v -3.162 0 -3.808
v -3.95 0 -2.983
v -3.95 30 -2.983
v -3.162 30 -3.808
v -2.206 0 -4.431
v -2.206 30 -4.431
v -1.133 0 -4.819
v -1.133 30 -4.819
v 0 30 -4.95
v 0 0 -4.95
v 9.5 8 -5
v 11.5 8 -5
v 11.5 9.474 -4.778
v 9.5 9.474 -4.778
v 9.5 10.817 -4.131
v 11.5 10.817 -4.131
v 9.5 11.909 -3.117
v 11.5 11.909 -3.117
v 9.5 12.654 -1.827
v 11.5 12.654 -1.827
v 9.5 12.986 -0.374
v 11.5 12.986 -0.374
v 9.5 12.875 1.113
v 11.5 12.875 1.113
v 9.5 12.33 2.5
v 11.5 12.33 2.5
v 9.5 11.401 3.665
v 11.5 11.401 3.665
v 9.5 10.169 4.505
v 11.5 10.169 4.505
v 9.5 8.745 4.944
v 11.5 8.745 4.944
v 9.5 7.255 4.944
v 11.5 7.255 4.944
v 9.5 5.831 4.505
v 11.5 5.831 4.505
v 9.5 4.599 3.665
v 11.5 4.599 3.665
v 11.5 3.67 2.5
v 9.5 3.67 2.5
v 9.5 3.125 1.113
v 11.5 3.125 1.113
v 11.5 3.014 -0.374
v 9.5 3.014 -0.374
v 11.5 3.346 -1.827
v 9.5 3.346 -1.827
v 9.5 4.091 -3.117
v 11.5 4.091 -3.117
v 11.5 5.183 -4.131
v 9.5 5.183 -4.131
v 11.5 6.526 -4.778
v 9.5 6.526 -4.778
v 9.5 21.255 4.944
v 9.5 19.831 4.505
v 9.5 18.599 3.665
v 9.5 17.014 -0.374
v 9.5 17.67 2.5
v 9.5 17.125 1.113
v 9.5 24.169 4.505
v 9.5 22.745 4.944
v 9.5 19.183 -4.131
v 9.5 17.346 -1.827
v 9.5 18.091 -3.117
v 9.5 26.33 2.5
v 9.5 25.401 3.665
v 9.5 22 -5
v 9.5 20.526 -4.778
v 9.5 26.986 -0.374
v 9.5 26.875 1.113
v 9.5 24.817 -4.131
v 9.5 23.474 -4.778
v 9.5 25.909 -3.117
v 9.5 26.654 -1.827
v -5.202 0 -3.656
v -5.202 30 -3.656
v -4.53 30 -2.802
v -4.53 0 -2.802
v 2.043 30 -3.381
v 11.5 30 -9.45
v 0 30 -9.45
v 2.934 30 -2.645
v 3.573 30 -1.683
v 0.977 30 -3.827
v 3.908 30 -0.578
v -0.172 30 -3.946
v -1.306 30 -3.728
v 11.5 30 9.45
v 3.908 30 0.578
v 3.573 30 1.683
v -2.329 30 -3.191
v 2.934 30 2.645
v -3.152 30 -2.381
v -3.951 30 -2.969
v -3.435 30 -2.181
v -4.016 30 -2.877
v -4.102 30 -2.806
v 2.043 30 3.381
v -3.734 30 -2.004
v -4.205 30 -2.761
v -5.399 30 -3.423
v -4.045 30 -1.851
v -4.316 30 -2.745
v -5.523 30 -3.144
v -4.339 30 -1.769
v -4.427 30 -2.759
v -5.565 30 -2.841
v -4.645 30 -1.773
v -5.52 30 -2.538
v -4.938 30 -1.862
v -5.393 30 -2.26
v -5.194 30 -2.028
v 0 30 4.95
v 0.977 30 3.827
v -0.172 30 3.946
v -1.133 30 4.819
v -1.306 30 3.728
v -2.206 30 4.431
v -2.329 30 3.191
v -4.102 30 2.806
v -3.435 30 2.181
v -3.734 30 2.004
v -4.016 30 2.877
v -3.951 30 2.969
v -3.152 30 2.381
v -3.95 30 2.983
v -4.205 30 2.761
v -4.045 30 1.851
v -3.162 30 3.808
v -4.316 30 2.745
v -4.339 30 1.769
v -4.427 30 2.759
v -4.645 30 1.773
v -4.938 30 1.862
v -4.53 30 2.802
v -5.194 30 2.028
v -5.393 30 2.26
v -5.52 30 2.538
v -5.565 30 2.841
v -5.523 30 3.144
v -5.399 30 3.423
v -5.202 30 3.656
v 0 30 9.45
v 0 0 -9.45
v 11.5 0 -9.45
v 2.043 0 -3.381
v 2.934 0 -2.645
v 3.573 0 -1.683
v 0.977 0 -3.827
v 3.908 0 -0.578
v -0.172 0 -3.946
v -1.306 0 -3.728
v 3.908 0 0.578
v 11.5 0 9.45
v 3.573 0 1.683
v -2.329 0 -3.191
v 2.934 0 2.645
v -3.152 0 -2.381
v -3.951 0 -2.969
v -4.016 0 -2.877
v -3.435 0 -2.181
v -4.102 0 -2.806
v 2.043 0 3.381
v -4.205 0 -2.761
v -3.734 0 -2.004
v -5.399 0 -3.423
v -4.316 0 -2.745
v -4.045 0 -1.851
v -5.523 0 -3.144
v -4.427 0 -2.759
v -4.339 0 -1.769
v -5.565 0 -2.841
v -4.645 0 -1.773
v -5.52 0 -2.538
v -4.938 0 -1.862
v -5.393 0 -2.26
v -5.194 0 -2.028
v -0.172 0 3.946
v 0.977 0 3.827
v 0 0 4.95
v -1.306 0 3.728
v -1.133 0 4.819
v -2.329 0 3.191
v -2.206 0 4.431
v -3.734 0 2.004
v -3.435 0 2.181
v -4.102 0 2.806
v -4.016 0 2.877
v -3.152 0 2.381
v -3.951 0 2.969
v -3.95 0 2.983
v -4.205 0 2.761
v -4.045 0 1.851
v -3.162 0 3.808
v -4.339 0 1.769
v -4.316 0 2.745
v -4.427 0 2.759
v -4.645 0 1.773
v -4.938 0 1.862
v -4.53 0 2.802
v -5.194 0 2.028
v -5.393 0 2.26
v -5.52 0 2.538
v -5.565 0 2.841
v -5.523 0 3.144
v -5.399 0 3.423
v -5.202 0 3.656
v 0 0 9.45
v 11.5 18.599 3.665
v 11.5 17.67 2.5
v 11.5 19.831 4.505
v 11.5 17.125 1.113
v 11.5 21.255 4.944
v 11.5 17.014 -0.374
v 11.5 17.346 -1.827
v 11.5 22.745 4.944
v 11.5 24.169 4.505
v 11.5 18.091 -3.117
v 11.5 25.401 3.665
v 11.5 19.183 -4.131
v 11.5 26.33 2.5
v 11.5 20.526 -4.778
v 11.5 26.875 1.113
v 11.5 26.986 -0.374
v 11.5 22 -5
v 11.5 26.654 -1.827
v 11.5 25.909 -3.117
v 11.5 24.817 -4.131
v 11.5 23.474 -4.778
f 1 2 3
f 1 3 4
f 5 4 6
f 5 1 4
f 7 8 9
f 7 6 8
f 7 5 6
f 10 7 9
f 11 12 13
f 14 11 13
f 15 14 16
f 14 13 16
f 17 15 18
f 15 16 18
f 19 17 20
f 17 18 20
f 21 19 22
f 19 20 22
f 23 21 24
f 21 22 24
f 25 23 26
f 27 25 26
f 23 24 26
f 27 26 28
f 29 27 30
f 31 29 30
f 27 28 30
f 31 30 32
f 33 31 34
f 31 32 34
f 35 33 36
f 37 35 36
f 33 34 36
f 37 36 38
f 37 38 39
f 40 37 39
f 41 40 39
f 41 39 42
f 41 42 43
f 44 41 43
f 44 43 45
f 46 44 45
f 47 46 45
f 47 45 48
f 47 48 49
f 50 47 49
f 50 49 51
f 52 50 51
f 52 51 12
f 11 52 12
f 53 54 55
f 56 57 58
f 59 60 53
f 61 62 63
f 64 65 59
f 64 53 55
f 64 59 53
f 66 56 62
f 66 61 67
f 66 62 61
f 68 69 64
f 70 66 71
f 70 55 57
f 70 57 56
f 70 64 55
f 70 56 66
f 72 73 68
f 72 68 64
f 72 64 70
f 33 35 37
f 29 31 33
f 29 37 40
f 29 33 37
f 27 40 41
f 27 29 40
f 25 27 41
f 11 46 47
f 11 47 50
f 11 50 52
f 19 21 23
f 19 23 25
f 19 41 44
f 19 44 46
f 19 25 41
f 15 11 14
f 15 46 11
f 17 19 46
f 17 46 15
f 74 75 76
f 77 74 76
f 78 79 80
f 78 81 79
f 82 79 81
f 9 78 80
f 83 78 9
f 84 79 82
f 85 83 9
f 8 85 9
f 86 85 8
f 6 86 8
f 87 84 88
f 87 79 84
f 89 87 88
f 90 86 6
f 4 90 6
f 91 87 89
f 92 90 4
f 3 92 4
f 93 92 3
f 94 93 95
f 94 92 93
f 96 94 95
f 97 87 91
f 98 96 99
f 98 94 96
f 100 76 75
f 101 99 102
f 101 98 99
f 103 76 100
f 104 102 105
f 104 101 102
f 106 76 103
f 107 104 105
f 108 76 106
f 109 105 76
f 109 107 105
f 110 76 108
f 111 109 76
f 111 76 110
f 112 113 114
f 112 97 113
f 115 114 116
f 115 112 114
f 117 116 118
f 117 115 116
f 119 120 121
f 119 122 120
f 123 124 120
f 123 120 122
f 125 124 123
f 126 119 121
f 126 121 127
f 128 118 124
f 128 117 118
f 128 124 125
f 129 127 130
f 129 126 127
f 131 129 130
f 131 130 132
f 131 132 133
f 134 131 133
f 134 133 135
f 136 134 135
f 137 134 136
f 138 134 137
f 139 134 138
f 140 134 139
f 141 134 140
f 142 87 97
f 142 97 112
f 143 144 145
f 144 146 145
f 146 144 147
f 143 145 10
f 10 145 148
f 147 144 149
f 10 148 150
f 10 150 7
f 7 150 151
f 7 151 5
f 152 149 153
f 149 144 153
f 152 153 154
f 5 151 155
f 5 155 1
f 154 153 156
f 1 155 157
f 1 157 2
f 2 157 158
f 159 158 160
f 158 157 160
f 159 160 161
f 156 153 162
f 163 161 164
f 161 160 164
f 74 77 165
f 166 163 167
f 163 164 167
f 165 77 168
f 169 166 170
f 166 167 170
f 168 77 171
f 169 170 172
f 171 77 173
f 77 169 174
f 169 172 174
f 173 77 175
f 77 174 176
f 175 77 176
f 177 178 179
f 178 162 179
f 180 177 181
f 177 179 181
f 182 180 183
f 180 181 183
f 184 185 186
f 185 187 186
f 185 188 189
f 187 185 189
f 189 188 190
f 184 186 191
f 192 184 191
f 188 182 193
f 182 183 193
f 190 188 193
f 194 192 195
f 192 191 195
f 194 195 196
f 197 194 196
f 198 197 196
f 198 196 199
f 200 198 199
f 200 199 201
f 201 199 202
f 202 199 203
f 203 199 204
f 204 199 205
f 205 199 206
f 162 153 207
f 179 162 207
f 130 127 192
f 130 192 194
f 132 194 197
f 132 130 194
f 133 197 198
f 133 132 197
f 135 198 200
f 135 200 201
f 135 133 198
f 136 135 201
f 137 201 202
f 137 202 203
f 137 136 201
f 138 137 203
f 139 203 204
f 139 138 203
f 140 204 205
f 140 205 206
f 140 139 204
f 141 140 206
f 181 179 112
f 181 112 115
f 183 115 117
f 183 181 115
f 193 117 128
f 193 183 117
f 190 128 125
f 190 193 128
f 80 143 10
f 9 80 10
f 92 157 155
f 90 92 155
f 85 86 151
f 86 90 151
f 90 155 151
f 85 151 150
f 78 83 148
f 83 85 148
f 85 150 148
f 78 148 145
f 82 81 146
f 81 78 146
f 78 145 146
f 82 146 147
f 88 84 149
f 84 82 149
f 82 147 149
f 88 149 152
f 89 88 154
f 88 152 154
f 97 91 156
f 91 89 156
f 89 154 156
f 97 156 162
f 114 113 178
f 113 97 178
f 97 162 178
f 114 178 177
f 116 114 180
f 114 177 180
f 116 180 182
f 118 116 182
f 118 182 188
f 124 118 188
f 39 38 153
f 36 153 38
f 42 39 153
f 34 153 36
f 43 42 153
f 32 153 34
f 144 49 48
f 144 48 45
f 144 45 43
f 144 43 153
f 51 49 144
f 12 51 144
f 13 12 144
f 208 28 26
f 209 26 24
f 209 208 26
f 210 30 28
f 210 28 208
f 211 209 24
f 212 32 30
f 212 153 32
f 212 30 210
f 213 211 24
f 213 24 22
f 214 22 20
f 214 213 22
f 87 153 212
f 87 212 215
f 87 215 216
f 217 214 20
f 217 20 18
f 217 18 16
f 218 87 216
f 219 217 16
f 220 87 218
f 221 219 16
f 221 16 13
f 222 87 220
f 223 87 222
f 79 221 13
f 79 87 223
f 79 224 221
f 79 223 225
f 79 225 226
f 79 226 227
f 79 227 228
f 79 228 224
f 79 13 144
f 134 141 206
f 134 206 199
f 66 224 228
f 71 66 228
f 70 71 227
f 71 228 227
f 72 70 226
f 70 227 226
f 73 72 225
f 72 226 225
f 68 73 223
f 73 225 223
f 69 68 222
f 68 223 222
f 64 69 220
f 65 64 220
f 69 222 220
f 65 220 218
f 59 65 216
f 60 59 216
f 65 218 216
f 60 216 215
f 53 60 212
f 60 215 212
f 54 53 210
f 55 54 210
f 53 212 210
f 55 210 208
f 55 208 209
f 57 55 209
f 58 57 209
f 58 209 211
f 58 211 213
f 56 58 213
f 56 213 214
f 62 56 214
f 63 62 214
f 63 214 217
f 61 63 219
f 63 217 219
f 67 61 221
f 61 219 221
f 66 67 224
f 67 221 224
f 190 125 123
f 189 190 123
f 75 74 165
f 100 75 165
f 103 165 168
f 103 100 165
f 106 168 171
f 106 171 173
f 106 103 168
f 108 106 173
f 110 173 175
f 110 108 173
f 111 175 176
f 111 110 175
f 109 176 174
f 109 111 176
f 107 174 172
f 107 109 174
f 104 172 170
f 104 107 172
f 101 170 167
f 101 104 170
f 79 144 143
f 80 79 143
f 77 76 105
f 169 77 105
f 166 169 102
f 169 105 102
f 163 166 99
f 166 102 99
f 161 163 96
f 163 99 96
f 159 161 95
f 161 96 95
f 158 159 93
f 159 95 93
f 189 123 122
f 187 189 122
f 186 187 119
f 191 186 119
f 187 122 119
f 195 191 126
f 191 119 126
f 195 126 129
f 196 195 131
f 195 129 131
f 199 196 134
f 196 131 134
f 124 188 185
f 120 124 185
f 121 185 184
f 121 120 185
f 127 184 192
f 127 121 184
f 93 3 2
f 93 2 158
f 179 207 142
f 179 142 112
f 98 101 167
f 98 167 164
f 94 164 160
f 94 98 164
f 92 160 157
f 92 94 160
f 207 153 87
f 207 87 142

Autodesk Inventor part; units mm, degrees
ref_plane "YZ Plane" through (0, 0, 0) normal (1, 0, 0) x (0, 1, 0)
ref_plane "XZ Plane" through (0, 0, 0) normal (0, 1, 0) x (-1, 0, 0)
ref_plane "XY Plane" through (0, 0, 0) normal (0, 0, 1) x (1, 0, 0)
sketch "Эскиз1" plane through (0, 0, 0) normal (0, 1, 0) x (-1, 0, 0)
  circle A0 centre (0, 0) radius 3.95
  circle A1 centre (0, 0) radius 4.95
  line L0 (0, 0) -> (3.95, 2.9833)
  line L1 (0, 0) -> (3.95, -2.9833)
  point P0 (3.152, -2.3806)
  point P1 (3.152, 2.3806)
  dimension "d0" = 7.9
  dimension "d1" = 9.9
extrude "Выдавливание1" add sketch "Эскиз1" along normal blind 30 contours A0 L1 A1 L0 picked at (3.1693, 3.3115)
sketch "Эскиз2" plane through (0, 30, 0) normal (0, 1, 0) x (1, 0, 0)
  arc A0 (-3.152, -2.3806) -> (-3.152, 2.3806) centre (0, 0) ccw projected
  arc A1 (-3.152, -2.3806) -> (-4.0447, -1.8507) centre (-5.8533, -5.9145) ccw
  arc A2 (-4.0447, -1.8507) -> (-5.2016, -3.6565) centre (-4.4791, -2.8459) ccw
  line L0 (-5.2016, -3.6565) -> (-4.5303, -2.802)
  arc A3 (-3.9514, -2.9687) -> (-4.5303, -2.802) centre (-4.3197, -3.1592) ccw
  line L1 (0, 0) -> (-3.2711, 0)
  arc A4 (-4.0447, 1.8507) -> (-3.152, 2.3806) centre (-5.8533, 5.9145) ccw
  arc A5 (-5.2016, 3.6565) -> (-4.0447, 1.8507) centre (-4.4791, 2.8459) ccw
  line L2 (-5.2016, 3.6565) -> (-4.5303, 2.802)
  arc A6 (-4.5303, 2.802) -> (-3.9514, 2.9687) centre (-4.3197, 3.1592) ccw
  line L3 (-3.152, -2.3806) -> (-3.95, -2.9833) projected
  line L4 (-3.95, -2.9833) -> (-3.152, -2.3806)
  line L5 (-3.95, -2.9833) -> (-3.9514, -2.9687)
  line L6 (-3.152, 2.3806) -> (-3.95, 2.9833)
  line L7 (-3.95, 2.9833) -> (-3.9514, 2.9687)
extrude "Выдавливание2" add sketch "Эскиз2" against normal blind 30
sketch "Эскиз3" plane through (0, 30, 0) normal (0, 1, 0) x (1, 0, 0)
  arc A0 (-3.95, -2.9833) -> (-3.95, 2.9833) centre (0, 0) ccw projected
  line L0 (11.5, -5.45) -> (11.5, 5.45)
  arc A1 (-3.152, -2.3806) -> (-3.152, 2.3806) centre (0, 0) ccw projected
  arc A2 (0, -3.95) -> (0, 3.95) centre (0, 0) ccw
  line L1 (0, -4.95) -> (0, -3.95)
  line L2 (0, 3.95) -> (0, 4.95)
  line L3 (11.5, 5.45) -> (11.5, 9.45)
  line L4 (11.5, -5.45) -> (11.5, -9.45)
  line L5 (11.5, 9.45) -> (0, 9.45)
  line L6 (0, 9.45) -> (0, 4.95)
  line L7 (11.5, -9.45) -> (0, -9.45)
  line L8 (0, -9.45) -> (0, -4.95)
  dimension "d13" = 4
  dimension "d14" = 4
  dimension "d21" = 11.5
  dimension "d22" = 18.9
  dimension "d23" = 5.5
extrude "Выдавливание3" add sketch "Эскиз3" against normal blind 30 contours A0 L6 L5 L3 L0 L4 L7 L8
sketch "Эскиз4" plane through (11.5, 20, 4.95) normal (1, 0, 0) x (0, 0, -1)
  line L0 (4.95, -20) -> (4.95, 10)
  line L1 (1, 10) -> (8.9, 10) projected
  circle A0 centre (4.95, -12) radius 5
  line L2 (14.4, -20) -> (-4.5, -20) projected
  circle A1 centre (4.95, 2) radius 5
  line L3 (-4.5, 10) -> (14.4, 10) projected
  point P0 (7.3306, 10)
  point P1 (2.5694, 10)
  point P2 (4.95, 10)
  dimension "d15" = 10
  dimension "d16" = 8
  dimension "d17" = 10
  dimension "d18" = 8
extrude "Выдавливание4" cut sketch "Эскиз4" against normal blind 2
properties part number "крепление маркера"
